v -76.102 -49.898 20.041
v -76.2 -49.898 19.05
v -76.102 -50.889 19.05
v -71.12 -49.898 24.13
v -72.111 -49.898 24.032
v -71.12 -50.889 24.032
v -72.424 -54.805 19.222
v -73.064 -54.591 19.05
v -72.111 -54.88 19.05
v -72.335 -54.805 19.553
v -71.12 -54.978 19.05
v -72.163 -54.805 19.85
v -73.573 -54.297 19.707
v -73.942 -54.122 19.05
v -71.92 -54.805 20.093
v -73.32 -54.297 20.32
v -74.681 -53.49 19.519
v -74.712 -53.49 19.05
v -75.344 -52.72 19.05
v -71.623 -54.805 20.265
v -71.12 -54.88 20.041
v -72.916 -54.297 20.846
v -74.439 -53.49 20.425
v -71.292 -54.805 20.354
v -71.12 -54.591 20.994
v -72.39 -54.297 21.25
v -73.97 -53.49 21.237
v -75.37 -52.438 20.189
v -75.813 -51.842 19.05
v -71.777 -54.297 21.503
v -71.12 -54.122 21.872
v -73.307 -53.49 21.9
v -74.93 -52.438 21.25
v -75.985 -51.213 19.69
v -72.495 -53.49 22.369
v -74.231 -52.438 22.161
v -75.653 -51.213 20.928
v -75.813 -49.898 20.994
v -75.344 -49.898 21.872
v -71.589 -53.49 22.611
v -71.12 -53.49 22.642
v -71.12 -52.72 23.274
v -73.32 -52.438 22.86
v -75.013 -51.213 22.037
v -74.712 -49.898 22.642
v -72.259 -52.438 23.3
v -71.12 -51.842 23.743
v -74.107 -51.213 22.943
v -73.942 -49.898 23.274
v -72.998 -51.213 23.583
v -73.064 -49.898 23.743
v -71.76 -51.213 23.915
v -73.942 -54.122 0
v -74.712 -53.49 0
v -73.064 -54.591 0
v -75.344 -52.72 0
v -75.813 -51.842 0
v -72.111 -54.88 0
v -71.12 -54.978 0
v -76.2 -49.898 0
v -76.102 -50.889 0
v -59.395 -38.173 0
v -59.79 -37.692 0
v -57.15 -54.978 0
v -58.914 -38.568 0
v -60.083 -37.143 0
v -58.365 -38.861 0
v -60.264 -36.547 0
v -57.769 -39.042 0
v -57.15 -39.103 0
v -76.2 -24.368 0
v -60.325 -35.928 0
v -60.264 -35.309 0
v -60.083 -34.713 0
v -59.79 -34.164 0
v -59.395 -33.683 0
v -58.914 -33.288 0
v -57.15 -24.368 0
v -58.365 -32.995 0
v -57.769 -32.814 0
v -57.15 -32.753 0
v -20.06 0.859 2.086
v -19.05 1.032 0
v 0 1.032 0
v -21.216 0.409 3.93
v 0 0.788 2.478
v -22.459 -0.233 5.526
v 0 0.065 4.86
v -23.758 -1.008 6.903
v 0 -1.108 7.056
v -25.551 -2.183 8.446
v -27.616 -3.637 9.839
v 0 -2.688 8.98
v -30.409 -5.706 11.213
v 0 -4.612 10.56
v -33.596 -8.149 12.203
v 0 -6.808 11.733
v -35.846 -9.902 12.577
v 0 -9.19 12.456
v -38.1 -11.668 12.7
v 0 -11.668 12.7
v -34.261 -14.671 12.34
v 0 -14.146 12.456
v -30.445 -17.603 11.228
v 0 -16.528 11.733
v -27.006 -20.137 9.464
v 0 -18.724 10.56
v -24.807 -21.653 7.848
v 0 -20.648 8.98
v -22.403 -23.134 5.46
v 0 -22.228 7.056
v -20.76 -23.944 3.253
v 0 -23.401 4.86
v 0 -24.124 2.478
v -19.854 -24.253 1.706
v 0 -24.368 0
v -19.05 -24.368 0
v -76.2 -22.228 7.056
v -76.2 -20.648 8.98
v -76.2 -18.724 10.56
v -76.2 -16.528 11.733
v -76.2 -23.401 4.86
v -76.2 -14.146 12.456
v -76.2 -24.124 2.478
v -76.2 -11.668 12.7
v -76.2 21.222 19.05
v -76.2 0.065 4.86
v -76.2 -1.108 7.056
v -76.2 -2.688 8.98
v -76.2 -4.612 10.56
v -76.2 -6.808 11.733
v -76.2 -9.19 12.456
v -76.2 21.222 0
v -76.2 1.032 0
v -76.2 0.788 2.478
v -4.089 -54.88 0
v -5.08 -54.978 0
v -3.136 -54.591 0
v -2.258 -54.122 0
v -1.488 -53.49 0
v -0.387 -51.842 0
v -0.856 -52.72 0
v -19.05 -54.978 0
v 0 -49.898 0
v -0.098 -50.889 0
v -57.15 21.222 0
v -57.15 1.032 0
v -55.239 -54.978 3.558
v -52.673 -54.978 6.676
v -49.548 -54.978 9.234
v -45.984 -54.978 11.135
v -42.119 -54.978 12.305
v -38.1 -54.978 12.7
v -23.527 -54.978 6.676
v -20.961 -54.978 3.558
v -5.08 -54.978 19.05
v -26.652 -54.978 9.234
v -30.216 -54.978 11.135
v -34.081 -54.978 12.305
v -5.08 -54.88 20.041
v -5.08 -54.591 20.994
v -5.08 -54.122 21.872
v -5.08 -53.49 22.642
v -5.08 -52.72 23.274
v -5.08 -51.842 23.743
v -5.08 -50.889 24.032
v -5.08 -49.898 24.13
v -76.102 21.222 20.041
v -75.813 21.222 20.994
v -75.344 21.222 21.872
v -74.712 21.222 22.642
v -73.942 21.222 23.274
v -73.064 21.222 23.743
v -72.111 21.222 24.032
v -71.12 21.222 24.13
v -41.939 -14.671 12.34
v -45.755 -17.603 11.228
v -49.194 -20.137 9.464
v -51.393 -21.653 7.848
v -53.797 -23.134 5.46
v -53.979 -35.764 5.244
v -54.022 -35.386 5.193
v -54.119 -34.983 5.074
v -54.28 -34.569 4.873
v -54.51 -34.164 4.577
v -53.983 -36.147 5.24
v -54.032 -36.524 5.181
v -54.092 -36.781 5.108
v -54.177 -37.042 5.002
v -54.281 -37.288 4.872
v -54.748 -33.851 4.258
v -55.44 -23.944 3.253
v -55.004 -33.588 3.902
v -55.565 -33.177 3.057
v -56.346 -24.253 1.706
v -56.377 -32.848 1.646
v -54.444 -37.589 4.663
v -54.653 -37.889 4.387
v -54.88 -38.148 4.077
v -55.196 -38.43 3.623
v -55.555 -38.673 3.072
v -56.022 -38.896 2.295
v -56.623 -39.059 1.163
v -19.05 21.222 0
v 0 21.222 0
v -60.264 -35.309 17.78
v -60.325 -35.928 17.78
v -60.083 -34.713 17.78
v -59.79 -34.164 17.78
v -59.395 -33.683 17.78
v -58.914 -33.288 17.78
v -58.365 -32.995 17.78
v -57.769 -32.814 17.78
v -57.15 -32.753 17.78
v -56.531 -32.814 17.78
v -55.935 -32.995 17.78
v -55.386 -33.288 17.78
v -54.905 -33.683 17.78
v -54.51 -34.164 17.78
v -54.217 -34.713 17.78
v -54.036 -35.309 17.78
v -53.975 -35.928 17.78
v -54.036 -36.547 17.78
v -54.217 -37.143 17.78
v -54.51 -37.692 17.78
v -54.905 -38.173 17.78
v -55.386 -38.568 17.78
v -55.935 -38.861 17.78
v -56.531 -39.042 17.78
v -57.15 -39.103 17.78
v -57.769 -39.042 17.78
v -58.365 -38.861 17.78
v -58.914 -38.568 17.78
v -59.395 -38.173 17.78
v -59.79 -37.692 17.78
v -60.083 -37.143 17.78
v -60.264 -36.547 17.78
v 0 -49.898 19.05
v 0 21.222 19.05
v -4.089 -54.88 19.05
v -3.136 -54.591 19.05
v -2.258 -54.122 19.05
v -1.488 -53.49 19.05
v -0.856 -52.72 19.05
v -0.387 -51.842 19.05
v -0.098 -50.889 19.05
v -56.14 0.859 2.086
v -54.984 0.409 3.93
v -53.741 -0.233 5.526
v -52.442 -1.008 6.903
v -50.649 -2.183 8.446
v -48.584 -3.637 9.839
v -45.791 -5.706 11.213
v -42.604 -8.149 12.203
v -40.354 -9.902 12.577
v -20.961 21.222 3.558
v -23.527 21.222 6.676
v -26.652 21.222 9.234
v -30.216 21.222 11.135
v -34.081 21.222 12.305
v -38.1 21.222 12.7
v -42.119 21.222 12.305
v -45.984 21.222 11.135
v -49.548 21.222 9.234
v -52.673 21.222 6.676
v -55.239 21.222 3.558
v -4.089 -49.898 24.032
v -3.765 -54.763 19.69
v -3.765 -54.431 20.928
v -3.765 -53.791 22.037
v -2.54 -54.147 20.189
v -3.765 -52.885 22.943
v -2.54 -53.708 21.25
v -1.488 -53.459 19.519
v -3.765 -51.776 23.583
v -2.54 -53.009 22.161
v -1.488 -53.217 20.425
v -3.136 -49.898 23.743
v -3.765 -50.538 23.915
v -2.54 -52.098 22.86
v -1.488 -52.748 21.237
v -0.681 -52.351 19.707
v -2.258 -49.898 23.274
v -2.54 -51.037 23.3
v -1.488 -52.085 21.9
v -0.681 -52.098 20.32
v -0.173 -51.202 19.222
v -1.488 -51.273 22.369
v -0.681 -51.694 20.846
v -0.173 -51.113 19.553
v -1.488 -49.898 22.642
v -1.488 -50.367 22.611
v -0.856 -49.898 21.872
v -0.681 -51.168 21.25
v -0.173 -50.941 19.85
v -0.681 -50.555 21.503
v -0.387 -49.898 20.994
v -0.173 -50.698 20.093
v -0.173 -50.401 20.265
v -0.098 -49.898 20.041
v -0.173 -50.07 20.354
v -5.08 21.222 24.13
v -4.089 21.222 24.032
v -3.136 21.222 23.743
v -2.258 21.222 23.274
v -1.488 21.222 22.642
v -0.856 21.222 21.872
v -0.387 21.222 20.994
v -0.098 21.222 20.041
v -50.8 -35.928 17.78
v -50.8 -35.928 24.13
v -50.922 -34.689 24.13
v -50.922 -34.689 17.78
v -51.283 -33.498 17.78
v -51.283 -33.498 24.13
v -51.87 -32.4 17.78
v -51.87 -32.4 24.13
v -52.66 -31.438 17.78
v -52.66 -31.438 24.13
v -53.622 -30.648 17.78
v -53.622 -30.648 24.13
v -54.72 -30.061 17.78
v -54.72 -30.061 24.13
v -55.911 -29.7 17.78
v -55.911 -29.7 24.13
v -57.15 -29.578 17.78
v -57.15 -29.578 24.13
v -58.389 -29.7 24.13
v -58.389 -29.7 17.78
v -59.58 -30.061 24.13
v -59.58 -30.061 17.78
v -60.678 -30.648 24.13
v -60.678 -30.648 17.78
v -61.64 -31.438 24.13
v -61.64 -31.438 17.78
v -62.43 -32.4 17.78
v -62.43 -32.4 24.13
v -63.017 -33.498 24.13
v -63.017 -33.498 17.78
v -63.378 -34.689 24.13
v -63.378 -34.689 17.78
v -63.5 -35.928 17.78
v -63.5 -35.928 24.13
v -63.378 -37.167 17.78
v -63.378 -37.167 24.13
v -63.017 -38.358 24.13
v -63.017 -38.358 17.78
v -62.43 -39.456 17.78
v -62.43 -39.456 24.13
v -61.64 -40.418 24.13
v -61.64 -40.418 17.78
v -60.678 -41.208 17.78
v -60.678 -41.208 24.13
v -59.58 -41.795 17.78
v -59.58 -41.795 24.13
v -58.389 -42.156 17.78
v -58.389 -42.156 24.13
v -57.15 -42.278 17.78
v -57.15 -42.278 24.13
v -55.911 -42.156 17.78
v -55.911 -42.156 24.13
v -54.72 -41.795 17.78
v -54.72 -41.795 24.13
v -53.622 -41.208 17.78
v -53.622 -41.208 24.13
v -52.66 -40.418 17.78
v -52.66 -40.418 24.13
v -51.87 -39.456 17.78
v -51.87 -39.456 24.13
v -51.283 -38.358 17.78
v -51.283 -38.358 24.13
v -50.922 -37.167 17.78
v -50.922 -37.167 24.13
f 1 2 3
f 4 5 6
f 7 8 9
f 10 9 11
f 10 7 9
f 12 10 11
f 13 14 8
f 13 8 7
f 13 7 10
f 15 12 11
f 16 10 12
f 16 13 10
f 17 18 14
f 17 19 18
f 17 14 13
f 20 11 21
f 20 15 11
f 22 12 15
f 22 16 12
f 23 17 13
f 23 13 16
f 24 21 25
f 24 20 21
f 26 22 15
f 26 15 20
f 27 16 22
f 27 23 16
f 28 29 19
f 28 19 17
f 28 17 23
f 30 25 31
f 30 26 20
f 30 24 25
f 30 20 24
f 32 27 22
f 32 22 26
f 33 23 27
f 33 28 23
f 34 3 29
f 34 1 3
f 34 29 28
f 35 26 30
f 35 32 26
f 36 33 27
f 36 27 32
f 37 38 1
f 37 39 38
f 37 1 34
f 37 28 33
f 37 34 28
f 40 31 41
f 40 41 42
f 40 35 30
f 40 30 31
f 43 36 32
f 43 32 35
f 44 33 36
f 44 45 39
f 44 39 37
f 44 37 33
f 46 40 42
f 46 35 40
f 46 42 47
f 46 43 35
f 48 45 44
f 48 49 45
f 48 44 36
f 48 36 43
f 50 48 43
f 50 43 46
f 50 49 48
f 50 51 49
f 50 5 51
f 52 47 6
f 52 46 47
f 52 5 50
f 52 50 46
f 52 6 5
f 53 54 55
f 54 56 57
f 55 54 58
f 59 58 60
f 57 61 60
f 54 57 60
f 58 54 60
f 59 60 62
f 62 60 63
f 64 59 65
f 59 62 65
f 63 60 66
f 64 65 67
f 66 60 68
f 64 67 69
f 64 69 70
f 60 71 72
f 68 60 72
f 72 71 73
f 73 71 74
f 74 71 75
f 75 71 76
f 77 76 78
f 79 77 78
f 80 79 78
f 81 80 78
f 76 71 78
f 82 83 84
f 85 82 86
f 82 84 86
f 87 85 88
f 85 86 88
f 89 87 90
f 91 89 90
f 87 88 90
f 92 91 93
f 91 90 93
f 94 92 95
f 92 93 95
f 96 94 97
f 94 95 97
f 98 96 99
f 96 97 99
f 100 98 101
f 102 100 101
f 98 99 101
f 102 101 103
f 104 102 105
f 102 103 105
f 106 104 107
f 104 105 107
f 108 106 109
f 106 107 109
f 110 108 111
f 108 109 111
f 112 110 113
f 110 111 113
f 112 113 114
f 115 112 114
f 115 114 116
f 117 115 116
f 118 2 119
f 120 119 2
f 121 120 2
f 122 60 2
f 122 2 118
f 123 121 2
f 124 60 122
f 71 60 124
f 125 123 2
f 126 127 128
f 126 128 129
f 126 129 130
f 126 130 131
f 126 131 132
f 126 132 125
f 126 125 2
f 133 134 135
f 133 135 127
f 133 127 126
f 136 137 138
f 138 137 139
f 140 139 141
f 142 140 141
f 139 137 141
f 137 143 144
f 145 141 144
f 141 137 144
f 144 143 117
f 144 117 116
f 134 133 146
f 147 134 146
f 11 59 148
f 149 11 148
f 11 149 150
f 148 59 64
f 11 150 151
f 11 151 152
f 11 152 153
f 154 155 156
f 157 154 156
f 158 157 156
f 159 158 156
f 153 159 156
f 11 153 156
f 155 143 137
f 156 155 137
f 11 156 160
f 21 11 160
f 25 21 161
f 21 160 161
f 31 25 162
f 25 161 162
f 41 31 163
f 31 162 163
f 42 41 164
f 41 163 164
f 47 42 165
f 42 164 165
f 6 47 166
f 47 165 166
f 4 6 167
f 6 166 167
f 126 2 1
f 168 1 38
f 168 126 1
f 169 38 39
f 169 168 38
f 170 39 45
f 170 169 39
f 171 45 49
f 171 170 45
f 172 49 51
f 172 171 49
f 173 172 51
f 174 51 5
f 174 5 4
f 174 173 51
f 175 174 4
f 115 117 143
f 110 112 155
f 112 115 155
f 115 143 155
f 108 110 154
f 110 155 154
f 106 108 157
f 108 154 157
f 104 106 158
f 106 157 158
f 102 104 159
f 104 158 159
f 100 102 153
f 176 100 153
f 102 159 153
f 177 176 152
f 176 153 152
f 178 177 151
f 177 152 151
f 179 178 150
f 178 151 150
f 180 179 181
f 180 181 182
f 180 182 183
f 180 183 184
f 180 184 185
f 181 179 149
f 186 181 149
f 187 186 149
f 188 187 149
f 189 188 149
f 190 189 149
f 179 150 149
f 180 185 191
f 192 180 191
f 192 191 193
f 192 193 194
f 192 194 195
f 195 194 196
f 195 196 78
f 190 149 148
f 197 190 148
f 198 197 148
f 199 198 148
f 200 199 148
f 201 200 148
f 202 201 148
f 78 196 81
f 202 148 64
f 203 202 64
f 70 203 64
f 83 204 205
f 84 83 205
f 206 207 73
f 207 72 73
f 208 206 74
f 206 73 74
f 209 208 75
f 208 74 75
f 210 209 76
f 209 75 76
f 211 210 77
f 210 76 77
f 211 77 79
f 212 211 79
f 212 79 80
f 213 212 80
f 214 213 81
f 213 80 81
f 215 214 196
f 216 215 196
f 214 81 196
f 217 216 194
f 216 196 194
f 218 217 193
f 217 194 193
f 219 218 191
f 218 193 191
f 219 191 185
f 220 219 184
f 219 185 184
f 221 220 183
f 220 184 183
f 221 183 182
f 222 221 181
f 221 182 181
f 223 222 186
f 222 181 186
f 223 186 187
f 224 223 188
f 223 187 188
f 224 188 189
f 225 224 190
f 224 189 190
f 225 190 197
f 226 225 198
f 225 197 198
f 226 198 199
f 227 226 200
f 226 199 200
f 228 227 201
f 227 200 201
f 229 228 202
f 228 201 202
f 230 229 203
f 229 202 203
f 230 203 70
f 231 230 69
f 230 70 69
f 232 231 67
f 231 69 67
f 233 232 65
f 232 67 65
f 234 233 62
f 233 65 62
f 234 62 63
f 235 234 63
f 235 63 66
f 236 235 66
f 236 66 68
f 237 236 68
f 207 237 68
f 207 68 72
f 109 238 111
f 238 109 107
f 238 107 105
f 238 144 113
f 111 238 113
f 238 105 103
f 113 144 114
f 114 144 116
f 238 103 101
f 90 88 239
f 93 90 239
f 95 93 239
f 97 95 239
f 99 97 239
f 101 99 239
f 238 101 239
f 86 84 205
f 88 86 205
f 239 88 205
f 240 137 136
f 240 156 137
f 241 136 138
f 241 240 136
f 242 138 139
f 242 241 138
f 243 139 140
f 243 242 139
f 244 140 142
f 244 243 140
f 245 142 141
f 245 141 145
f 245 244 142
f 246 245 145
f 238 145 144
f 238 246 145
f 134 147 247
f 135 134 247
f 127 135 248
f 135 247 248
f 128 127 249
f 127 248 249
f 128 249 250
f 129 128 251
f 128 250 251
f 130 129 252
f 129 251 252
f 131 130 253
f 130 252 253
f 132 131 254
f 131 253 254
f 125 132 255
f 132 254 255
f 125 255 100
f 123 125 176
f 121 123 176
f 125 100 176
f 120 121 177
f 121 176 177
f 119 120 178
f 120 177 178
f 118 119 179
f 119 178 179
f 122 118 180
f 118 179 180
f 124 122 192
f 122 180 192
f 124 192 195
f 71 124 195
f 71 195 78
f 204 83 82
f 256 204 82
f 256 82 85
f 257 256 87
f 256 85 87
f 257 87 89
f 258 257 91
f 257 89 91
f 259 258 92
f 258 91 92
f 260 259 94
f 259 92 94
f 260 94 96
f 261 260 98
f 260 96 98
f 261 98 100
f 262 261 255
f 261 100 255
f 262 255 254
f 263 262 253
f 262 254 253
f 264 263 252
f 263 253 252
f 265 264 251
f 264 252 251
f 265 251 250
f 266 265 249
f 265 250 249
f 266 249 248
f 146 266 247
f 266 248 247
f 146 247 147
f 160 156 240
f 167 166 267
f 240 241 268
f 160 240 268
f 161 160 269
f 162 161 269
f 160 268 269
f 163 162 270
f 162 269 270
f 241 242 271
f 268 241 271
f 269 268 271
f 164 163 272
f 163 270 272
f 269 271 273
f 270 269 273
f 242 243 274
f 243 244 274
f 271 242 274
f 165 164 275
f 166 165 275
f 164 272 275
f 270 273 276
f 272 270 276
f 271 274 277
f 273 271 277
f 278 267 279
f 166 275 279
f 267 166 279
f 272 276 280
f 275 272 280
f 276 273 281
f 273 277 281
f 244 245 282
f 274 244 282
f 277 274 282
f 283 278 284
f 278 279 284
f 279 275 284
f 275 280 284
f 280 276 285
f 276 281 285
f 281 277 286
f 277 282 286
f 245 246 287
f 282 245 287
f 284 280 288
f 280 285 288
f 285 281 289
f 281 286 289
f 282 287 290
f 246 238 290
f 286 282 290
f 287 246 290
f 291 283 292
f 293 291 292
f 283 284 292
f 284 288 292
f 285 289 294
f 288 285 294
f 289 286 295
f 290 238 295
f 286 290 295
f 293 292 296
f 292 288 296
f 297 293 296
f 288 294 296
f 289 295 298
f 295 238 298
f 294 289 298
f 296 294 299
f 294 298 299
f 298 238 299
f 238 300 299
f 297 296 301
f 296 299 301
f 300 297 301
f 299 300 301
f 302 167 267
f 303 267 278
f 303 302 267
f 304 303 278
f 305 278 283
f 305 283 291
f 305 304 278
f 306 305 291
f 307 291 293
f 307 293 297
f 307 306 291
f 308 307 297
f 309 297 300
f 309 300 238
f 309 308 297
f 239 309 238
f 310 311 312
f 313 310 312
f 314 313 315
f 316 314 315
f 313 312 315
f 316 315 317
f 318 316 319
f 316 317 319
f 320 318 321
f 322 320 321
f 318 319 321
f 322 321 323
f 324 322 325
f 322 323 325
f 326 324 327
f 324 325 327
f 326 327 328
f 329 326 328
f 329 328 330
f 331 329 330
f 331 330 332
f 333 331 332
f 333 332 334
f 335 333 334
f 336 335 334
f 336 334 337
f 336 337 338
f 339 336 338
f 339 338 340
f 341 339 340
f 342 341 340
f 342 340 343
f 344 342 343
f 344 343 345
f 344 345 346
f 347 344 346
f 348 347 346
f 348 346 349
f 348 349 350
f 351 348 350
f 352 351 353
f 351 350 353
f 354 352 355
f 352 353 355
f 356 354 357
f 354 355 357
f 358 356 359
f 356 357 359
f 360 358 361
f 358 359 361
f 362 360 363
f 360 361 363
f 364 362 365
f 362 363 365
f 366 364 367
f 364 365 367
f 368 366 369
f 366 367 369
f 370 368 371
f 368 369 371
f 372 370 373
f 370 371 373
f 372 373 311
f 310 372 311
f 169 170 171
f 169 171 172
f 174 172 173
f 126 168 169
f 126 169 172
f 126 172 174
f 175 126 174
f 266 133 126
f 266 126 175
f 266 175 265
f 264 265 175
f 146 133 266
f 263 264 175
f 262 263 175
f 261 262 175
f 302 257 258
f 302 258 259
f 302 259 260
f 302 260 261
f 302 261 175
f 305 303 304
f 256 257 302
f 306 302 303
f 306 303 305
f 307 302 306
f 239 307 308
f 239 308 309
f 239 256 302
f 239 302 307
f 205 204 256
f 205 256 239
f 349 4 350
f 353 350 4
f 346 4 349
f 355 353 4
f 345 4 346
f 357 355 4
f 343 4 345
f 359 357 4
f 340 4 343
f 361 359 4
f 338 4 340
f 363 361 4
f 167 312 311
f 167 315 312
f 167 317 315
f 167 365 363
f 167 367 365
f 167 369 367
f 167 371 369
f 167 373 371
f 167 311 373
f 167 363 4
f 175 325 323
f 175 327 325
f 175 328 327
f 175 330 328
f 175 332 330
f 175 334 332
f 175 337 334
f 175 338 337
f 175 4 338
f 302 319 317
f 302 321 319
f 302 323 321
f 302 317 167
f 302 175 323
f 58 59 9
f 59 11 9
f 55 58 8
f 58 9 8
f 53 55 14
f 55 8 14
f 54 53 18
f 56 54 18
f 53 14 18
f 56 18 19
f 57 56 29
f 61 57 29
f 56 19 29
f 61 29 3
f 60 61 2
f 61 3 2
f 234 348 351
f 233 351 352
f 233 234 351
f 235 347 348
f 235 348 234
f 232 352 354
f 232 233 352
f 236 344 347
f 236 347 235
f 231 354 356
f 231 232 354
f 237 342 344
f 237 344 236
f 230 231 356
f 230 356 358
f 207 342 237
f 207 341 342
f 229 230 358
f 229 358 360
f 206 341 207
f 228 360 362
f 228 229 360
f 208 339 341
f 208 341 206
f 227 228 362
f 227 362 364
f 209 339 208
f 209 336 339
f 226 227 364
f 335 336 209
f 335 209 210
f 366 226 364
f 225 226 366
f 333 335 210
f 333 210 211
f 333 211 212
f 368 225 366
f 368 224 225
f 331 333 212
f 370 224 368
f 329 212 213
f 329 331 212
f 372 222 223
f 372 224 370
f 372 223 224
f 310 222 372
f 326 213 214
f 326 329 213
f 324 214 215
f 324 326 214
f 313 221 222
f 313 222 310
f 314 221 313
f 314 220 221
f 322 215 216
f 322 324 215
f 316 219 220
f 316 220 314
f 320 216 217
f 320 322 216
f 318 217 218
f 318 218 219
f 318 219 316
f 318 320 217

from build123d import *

# Parameters (mm, degrees)
F0_W           = 76.2
F0_H           = 76.2
F1_DEPTH       = 24.13
F3_DEPTH       = 76.201
F5_DEPTH       = 76.201
F7_D           = 6.35
F7_CBORE_D     = 12.7
F7_CBORE_DEPTH = 6.35
F8_R           = 5.08
F9_R           = 5.08
F10_R          = 5.08


with BuildPart() as f1:
    # F0 (on Top) → F1 (new body)
    with BuildSketch(Plane.XY):
        with Locations((-38.1, -16.877948)):
            Rectangle(F0_W, F0_H)
    extrude(amount=F1_DEPTH)

    # F2 (on face) → F3 (cut, through all)
    with BuildSketch(Plane.YZ):
        with BuildLine():
            Line((-24.367969, 0), (1.032031, 0))
            ThreePointArc((1.032031, 0), (-11.667969, 12.7), (-24.367969, 0))
        make_face()
    extrude(amount=-F3_DEPTH, mode=Mode.SUBTRACT)

    # F4 (on face) → F5 (cut, through all)
    with BuildSketch(Plane.XZ.offset(54.977948)):
        with BuildLine():
            Line((-57.15, 0), (-19.05, 0))
            ThreePointArc((-19.05, 0), (-38.1, 12.7), (-57.15, 0))
        make_face()
    extrude(amount=-F5_DEPTH, mode=Mode.SUBTRACT)

    # F7 (through all)
    with Locations(Plane.XY.offset(24.13)):
        with Locations((-57.15, -35.927948)):
            CounterBoreHole(F7_D / 2, F7_CBORE_D / 2, F7_CBORE_DEPTH)

    # F8
    f8_edges = [f1.edges().sort_by_distance(p)[0] for p in [
        (-76.2, -16.877948, 24.13),
    ]]
    fillet(f8_edges, radius=F8_R)

    # F9
    f9_edges = [f1.edges().sort_by_distance(p)[0] for p in [
        (-35.56, -54.977948, 24.13),
    ]]
    fillet(f9_edges, radius=F9_R)

    # F10
    f10_edges = [f1.edges().sort_by_distance(p)[0] for p in [
        (0, -14.337948, 24.13),
    ]]
    fillet(f10_edges, radius=F10_R)


solid = f1.part
